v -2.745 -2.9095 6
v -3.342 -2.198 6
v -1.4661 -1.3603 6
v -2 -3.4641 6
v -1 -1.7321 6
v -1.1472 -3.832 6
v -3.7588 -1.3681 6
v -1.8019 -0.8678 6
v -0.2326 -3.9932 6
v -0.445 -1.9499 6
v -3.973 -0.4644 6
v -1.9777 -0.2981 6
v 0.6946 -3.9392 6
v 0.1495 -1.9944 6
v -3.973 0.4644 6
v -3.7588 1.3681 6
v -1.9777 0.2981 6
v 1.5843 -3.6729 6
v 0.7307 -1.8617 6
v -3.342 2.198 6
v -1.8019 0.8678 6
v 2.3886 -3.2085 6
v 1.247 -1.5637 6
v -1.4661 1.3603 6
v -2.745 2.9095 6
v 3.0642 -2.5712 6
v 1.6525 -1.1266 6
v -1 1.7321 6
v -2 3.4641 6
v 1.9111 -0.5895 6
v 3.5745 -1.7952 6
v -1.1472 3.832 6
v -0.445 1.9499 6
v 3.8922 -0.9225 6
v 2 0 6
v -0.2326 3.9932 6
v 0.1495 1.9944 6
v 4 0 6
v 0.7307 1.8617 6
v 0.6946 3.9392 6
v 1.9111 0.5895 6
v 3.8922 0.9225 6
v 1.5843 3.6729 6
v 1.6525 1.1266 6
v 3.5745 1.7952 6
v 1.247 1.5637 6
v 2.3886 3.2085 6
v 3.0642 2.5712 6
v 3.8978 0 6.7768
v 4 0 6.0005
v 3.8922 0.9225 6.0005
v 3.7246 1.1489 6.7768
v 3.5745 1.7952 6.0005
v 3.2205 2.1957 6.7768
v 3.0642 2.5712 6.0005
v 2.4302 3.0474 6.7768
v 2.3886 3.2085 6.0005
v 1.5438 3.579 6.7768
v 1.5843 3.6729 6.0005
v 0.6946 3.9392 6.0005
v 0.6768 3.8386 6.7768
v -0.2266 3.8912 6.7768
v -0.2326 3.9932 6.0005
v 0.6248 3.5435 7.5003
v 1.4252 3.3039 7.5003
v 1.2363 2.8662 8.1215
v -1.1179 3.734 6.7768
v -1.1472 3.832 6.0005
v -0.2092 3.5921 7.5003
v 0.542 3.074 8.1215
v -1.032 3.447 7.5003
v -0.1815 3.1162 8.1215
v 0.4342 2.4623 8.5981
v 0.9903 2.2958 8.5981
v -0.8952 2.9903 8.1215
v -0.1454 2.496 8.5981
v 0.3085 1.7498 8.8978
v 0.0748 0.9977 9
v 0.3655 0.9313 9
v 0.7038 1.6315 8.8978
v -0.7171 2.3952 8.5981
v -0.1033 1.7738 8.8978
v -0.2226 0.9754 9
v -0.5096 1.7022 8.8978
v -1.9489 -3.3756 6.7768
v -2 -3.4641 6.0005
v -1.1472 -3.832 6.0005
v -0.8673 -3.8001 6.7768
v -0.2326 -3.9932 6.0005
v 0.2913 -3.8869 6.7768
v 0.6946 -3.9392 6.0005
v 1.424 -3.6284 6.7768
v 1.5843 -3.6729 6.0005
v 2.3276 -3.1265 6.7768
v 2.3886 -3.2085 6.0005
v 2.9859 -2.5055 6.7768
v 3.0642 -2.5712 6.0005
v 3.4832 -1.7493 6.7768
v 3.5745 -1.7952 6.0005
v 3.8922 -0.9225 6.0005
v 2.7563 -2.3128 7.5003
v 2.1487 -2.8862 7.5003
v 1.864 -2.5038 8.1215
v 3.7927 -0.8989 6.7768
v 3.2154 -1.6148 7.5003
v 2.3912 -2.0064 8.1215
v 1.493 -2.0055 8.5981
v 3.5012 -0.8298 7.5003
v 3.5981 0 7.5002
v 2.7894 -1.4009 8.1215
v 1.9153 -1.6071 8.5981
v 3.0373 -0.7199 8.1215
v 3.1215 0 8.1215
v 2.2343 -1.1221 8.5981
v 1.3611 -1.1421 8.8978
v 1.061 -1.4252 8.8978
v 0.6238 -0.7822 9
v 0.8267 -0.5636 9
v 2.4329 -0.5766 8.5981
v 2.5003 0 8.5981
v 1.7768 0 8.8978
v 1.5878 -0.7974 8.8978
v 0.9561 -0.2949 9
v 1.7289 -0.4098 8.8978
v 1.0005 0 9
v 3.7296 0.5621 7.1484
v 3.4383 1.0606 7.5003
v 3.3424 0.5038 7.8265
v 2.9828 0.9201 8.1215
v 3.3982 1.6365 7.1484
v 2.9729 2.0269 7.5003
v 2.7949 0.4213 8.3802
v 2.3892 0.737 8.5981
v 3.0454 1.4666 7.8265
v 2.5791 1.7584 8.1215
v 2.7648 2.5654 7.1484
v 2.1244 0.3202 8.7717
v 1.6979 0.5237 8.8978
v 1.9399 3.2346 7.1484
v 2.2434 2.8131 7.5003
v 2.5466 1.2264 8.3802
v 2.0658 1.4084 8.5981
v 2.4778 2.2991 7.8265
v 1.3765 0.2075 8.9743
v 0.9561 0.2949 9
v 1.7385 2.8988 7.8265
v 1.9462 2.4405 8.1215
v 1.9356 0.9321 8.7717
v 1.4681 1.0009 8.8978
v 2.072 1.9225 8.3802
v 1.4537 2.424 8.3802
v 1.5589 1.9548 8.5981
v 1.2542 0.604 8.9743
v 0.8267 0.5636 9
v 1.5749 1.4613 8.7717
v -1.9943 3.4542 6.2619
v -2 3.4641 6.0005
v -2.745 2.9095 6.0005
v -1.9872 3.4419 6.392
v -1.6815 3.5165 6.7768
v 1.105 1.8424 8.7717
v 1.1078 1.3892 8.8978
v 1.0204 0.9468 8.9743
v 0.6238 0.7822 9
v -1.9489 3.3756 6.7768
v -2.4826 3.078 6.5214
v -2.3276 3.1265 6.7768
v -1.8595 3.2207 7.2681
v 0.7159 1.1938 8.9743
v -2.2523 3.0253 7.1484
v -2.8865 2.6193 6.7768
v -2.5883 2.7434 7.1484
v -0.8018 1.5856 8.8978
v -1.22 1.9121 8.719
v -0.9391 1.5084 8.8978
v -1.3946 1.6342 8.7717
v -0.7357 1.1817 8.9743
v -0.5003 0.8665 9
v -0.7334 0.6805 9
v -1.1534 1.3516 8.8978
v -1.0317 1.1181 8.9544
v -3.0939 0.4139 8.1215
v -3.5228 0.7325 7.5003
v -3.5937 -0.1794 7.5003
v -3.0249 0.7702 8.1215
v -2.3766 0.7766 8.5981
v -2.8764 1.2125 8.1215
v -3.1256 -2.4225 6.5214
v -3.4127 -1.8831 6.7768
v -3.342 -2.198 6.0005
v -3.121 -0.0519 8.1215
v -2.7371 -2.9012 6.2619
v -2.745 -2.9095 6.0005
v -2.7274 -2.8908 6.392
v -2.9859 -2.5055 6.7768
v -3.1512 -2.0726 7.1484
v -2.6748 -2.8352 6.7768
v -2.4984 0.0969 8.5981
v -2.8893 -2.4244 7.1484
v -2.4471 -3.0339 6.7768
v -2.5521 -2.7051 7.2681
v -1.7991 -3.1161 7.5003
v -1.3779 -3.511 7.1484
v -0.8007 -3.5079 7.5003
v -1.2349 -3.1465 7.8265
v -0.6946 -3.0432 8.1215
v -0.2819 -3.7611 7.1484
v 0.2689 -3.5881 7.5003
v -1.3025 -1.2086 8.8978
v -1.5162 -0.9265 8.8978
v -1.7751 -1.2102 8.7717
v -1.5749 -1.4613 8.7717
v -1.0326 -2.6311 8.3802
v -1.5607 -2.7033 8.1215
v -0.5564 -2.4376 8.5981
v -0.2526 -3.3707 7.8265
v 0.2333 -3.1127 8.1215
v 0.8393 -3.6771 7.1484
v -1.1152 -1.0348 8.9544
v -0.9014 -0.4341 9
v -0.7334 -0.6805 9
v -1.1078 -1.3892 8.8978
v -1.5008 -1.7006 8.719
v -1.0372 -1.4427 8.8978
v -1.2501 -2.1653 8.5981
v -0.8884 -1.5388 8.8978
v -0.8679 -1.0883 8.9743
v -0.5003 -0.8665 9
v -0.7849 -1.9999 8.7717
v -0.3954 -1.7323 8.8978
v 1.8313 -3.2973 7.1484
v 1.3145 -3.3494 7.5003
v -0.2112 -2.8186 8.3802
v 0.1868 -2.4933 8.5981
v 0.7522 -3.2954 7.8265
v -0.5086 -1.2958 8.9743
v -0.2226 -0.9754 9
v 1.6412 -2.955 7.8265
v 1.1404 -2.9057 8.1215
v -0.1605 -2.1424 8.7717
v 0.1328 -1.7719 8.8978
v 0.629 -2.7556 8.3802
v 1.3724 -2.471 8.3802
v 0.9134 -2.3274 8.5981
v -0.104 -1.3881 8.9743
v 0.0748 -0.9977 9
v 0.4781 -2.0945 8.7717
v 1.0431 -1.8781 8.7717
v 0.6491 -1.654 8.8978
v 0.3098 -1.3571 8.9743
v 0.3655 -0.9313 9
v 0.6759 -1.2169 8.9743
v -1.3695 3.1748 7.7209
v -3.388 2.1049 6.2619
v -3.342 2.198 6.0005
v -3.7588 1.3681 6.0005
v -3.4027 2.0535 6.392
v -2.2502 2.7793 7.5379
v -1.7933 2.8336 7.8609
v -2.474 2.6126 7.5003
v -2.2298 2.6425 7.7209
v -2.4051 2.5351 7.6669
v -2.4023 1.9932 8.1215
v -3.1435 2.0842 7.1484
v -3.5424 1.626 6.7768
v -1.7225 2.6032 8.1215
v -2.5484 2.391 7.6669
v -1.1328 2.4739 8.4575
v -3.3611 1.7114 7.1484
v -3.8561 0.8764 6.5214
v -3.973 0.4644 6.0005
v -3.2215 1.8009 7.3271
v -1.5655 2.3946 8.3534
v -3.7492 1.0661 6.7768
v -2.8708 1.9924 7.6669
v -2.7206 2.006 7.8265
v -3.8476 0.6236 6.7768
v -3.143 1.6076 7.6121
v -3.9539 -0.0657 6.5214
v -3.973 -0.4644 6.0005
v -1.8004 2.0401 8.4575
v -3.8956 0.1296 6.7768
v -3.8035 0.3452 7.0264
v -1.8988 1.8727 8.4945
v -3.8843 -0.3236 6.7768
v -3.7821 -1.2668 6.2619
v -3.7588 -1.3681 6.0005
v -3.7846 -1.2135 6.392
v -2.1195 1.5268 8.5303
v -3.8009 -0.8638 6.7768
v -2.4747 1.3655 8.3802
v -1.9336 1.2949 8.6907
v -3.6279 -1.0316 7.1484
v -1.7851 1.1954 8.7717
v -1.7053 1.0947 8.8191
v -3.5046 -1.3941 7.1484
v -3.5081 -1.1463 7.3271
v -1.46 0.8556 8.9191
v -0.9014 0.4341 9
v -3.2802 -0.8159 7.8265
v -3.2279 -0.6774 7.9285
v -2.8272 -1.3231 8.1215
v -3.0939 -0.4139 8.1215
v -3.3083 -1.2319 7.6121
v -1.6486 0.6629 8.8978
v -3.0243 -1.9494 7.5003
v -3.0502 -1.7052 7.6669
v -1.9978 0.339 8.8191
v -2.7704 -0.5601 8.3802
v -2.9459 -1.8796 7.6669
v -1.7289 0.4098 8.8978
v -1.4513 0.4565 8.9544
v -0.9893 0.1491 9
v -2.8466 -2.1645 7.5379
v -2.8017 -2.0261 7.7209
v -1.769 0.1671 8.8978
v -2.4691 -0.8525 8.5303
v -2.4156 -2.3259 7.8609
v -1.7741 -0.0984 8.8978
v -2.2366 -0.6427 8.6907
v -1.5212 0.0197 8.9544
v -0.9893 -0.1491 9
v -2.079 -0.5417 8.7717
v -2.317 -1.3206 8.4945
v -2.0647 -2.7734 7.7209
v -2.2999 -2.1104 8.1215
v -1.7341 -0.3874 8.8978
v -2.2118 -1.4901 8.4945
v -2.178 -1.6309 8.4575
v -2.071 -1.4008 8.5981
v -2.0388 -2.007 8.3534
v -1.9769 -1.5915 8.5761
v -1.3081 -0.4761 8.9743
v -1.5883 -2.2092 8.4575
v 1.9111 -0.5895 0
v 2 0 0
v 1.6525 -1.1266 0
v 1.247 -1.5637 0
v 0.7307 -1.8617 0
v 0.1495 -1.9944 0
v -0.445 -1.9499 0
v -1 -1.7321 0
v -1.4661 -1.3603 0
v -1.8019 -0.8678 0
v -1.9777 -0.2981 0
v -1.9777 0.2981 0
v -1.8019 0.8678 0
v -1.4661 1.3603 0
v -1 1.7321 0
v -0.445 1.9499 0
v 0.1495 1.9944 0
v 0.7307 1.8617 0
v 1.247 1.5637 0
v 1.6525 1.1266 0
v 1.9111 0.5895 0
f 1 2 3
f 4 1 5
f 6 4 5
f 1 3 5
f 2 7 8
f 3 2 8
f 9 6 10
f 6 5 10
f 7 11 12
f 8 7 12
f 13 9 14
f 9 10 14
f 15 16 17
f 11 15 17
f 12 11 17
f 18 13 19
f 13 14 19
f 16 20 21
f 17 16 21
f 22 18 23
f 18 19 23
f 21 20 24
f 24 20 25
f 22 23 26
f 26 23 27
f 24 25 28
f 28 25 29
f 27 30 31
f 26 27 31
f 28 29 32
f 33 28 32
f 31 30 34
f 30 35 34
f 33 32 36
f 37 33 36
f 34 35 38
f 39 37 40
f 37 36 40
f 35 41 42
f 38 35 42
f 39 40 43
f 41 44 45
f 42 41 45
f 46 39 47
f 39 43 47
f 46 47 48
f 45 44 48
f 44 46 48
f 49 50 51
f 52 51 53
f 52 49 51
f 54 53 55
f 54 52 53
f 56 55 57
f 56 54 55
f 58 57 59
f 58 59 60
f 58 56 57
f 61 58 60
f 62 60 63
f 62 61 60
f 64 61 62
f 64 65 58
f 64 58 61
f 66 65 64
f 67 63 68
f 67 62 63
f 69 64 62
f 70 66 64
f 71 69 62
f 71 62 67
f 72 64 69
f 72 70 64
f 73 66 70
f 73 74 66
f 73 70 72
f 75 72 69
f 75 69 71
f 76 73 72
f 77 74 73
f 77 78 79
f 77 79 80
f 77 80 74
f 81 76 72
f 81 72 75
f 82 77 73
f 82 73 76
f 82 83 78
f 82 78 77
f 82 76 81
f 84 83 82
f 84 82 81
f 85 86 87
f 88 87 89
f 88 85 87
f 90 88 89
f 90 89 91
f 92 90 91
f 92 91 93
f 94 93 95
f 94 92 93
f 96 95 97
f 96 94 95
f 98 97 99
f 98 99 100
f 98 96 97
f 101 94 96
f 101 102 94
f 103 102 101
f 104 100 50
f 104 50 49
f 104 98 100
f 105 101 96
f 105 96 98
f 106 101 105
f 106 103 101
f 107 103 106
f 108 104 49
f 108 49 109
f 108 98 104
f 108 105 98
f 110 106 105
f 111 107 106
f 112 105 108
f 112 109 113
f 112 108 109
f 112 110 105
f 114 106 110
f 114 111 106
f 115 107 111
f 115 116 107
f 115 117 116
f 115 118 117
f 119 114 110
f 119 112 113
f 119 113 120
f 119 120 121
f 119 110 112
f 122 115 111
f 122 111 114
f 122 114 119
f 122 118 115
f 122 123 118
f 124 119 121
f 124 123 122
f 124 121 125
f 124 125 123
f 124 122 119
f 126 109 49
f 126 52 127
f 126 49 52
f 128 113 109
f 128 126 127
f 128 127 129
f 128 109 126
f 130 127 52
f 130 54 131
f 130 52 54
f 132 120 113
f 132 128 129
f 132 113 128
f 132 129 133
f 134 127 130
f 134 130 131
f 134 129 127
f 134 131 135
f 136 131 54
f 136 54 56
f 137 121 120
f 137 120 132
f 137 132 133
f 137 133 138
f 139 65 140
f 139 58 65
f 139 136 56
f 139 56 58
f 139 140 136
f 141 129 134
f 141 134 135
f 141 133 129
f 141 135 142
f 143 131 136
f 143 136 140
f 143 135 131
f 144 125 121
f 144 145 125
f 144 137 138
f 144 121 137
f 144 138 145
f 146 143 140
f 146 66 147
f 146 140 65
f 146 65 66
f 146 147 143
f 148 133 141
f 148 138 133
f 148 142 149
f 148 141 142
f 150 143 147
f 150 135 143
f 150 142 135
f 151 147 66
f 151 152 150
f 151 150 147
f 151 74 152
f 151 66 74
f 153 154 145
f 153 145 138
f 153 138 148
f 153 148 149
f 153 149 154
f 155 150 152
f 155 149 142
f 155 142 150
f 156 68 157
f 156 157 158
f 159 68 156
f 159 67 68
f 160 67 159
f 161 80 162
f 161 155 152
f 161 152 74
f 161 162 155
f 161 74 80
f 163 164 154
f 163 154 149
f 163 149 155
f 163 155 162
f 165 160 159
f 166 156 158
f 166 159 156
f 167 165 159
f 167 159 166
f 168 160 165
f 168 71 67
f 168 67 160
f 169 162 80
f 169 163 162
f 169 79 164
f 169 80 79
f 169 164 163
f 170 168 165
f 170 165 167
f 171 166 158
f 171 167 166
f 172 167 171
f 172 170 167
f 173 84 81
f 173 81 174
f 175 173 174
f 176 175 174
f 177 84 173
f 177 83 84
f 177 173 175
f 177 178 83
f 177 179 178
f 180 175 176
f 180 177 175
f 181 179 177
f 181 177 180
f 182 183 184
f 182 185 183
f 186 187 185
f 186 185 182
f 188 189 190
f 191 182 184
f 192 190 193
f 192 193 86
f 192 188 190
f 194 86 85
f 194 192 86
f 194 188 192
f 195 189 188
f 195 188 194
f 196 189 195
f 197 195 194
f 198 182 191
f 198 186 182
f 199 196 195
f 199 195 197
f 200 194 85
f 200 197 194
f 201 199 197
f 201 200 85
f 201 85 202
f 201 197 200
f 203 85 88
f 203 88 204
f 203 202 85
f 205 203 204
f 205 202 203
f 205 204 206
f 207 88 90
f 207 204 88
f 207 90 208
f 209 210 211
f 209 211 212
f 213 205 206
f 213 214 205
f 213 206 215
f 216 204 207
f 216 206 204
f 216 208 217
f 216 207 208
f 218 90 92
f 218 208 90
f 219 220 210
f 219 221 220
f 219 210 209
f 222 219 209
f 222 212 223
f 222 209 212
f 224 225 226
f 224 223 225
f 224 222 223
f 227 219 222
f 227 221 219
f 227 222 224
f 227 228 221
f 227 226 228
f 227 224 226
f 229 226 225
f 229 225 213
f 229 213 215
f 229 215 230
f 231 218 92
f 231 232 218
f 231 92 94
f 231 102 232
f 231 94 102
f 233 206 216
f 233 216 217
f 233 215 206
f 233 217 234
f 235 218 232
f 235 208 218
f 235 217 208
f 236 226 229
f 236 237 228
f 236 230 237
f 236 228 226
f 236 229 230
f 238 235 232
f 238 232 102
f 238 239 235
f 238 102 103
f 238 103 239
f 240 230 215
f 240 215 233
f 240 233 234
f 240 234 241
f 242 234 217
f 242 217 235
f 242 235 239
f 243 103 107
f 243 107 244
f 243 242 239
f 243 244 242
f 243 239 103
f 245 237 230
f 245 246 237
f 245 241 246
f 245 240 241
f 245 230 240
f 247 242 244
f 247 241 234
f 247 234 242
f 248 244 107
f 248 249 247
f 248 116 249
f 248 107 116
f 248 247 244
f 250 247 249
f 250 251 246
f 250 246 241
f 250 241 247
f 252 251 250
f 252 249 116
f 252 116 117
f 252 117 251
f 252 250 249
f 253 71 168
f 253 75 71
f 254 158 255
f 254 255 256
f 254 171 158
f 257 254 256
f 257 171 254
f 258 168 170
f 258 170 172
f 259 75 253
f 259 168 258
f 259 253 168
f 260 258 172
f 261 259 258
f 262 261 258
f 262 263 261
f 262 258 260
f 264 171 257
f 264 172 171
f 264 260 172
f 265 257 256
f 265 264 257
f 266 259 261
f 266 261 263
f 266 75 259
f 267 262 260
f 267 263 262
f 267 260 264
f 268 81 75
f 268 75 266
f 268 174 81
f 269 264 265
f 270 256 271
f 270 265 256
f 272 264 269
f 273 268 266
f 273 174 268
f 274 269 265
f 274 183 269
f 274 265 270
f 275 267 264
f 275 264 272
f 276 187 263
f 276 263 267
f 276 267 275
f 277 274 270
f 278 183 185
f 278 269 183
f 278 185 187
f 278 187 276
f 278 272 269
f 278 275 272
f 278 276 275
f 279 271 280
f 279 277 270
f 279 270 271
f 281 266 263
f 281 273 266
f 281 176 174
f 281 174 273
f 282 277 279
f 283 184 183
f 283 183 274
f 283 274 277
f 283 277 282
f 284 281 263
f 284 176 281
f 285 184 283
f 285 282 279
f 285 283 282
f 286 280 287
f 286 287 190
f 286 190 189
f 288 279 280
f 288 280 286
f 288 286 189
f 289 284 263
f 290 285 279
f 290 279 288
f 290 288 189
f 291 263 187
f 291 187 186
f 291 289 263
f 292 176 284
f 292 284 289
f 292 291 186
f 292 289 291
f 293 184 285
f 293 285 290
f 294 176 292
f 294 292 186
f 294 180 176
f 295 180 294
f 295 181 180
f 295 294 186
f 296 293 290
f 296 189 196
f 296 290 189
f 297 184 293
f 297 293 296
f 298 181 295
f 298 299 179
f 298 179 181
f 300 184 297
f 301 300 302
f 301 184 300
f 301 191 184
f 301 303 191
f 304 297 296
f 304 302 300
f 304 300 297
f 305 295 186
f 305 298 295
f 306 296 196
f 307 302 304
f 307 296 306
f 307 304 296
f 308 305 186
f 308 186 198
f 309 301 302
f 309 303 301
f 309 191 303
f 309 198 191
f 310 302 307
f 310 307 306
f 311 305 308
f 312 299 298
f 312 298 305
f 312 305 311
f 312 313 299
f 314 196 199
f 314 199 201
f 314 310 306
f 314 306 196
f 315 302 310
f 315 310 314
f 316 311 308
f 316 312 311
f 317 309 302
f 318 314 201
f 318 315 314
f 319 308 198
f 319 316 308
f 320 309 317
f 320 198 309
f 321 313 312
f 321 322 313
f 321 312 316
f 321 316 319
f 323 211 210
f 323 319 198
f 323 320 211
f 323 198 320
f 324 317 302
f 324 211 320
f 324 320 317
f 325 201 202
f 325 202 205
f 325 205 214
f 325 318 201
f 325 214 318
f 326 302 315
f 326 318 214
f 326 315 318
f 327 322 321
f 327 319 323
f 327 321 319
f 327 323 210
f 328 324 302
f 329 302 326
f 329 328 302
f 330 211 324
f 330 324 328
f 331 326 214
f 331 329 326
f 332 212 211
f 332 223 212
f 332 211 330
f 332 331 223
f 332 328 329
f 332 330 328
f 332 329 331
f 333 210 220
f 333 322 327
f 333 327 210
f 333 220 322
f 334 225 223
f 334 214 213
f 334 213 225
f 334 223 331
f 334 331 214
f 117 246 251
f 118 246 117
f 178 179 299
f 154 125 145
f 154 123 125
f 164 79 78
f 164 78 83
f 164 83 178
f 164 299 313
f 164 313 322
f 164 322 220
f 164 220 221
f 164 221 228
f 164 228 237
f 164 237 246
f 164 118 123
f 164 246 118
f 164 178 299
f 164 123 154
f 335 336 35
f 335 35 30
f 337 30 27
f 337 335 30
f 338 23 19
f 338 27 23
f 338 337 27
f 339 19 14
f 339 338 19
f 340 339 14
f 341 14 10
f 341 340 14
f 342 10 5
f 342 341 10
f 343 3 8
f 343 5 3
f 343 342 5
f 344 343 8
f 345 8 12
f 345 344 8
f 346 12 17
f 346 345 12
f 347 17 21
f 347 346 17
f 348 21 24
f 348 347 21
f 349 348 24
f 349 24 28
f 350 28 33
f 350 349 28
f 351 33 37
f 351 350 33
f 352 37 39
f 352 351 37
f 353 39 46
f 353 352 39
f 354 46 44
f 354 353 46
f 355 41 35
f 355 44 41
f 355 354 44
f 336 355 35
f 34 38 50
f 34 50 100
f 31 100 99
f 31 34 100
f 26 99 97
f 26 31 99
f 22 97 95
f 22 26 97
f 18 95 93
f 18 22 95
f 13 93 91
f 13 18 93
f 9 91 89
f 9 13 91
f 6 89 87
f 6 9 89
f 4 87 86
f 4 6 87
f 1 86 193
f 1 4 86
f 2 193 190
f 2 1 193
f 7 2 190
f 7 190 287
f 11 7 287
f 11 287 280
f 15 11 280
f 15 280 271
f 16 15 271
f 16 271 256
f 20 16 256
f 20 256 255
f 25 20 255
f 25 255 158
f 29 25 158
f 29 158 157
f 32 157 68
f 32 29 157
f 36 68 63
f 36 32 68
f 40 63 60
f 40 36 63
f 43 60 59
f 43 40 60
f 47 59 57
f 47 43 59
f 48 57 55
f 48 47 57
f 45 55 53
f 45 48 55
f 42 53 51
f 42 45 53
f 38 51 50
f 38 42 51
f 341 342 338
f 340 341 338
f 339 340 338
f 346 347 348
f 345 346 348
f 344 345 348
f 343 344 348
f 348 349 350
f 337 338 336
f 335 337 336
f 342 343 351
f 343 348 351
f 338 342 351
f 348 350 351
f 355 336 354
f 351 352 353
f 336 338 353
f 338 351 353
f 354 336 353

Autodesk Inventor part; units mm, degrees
ref_plane "YZ Plane" through (0, 0, 0) normal (1, 0, 0) x (0, 1, 0)
ref_plane "XZ Plane" through (0, 0, 0) normal (0, 1, 0) x (-1, 0, 0)
ref_plane "XY Plane" through (0, 0, 0) normal (0, 0, 1) x (1, 0, 0)
sketch "スケッチ1" plane through (0, 0, 0) normal (0, 0, 1) x (1, 0, 0)
  circle A0 centre (0, 0) radius 2
  dimension "d0" = 4
extrude "押し出し1" add sketch "スケッチ1" along normal blind 6
sketch "スケッチ2" plane through (0, 0, 6) normal (0, 0, 1) x (1, 0, 0)
  circle A0 centre (0, 0) radius 2 projected
  circle A1 centre (0, 0) radius 4
  dimension "d3" = 8
extrude "押し出し2" add sketch "スケッチ2" along normal blind 3 contours A0 | A1
fillet "フィレット1" radius 3 1 edges at (-4, 0, 9)
thread "ねじ1" size "M4x0.7" class "6g" standard "ANSI Metric M Profile" full length
properties part number "SB　M4 6mm なべネジ" material "Stainless Steel, 440C"
